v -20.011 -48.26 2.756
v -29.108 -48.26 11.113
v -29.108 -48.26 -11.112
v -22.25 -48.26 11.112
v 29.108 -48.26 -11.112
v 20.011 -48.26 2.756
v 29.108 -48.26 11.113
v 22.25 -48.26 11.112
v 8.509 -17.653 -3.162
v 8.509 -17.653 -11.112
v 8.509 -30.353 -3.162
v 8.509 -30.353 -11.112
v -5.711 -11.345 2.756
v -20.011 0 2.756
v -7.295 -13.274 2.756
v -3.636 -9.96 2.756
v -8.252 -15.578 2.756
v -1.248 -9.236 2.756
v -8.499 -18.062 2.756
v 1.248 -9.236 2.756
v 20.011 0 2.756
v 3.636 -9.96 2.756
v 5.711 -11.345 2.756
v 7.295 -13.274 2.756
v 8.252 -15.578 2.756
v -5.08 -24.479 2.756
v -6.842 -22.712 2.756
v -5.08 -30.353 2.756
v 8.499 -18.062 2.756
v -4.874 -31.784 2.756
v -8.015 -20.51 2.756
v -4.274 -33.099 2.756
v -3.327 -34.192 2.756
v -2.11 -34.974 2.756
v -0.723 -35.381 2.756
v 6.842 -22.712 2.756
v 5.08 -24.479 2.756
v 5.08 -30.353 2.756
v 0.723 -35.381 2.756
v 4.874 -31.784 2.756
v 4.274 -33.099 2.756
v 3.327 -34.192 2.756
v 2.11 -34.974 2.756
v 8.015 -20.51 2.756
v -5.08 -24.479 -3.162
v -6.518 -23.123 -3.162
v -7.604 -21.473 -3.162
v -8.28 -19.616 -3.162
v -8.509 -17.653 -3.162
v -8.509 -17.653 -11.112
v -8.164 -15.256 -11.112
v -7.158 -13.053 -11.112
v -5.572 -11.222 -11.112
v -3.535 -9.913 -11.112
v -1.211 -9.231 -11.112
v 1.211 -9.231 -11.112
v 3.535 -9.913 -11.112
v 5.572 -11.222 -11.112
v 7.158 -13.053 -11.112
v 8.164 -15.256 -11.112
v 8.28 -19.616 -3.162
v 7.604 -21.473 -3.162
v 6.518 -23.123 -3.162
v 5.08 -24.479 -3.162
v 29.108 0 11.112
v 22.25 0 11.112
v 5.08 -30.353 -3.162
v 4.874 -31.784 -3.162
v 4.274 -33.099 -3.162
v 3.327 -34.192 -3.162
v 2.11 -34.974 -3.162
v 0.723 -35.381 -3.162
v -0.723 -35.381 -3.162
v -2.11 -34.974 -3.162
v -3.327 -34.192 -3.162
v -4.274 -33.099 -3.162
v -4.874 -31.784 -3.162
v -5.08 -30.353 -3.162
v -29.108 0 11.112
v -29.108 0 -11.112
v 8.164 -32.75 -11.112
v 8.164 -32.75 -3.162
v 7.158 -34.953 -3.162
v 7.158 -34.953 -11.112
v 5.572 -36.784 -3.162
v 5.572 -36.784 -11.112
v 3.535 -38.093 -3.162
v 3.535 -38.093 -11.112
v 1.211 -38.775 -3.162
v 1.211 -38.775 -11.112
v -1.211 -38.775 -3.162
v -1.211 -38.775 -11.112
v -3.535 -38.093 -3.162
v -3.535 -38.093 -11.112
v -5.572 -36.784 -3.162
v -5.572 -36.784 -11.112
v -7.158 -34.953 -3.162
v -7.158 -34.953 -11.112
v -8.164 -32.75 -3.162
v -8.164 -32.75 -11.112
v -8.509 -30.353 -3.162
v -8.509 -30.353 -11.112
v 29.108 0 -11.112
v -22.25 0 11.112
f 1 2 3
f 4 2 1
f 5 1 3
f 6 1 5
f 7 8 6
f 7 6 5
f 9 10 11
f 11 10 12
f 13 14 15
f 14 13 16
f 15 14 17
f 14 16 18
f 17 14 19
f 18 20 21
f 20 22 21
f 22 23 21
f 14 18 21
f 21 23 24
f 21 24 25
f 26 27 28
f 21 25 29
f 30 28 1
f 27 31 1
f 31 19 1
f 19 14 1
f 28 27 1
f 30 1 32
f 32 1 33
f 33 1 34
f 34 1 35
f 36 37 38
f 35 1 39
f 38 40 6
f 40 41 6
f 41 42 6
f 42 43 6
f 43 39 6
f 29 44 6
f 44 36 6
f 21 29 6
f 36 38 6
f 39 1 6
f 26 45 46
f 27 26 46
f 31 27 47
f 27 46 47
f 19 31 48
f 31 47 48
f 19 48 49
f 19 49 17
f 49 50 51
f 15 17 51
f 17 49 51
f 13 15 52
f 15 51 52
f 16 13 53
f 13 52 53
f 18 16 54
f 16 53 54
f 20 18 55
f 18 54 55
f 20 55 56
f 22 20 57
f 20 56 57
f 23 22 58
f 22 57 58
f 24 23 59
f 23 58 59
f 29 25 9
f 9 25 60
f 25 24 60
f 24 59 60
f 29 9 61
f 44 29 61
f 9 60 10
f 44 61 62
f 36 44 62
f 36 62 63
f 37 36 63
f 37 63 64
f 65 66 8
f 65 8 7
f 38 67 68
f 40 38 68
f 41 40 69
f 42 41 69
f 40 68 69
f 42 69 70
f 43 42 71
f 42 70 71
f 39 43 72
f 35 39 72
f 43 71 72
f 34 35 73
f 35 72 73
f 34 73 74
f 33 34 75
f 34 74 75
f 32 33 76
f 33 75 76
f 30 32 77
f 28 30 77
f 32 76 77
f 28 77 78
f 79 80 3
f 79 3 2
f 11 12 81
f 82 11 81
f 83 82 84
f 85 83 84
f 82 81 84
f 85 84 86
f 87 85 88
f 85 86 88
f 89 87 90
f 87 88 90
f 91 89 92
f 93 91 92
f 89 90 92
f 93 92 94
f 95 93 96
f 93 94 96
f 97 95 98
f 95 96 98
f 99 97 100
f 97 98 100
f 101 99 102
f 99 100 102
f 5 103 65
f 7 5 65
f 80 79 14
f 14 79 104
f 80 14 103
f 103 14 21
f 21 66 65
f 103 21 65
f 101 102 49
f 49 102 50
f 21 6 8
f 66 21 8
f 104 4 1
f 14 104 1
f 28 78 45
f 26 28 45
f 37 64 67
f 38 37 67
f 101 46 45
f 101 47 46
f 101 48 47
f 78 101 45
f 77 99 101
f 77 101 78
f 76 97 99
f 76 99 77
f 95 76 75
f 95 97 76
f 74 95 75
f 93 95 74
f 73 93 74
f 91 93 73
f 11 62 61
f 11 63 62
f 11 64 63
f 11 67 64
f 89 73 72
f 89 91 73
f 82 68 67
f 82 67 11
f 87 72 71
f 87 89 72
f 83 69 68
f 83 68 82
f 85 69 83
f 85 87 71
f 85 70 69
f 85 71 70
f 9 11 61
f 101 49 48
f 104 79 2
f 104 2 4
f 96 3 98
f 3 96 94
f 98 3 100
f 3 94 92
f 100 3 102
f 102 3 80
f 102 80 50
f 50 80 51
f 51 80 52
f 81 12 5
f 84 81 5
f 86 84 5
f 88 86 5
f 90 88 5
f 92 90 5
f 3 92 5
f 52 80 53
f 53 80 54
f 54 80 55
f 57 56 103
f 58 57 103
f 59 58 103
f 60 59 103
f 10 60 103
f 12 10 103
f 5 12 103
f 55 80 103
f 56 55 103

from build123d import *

# Parameters (mm, degrees)
F0_W     = 58.2168
F0_H     = 22.225
F1_DEPTH = 48.26
F3_DEPTH = 48.261
F5_DEPTH = 7.9502
F7_DEPTH = 14.2758


with BuildPart() as f1:
    # F0 (on Front) → F1 (new body)
    with BuildSketch(Plane.XZ):
        Rectangle(F0_W, F0_H)
    extrude(amount=F1_DEPTH)

    # F2 (on face) → F3 (cut, through all)
    with BuildSketch(Plane.XZ.offset(48.26)):
        Polygon((-22.2504, 11.1125), (-20.0112557785, 2.7559), (20.0112557785, 2.7559), (22.2504, 11.1125), (29.1084, 11.1125), (29.1084, 14.9114290252), (-29.1084, 14.9114290252), (-29.1084, 11.1125), align=None)
    extrude(amount=-F3_DEPTH, mode=Mode.SUBTRACT)

    # F4 (on face) → F5 (cut)
    with BuildSketch(Plane(origin=(0, 0, -11.1125), x_dir=(1, 0, 0), z_dir=(0, 0, -1))):
        with BuildLine():
            Line((8.509, 17.653), (8.509, 30.353))
            ThreePointArc((8.509, 30.353), (0, 38.862), (-8.509, 30.353))
            Line((-8.509, 30.353), (-8.509, 17.653))
            ThreePointArc((-8.509, 17.653), (0, 9.144), (8.509, 17.653))
        make_face()
    extrude(amount=-F5_DEPTH, mode=Mode.SUBTRACT)

    # F6 (on face) → F7 (cut, through all)
    with BuildSketch(Plane(origin=(0, 0, -3.1623), x_dir=(1, 0, 0), z_dir=(0, 0, -1))):
        with BuildLine():
            Line((-5.08, 30.353), (-5.08, 24.4791761624))
            ThreePointArc((-5.08, 24.4791761624), (0, 9.144), (5.08, 24.4791761624))
            Line((5.08, 24.4791761624), (5.08, 30.353))
            ThreePointArc((5.08, 30.353), (0, 35.433), (-5.08, 30.353))
        make_face()
    extrude(amount=-F7_DEPTH, mode=Mode.SUBTRACT)


solid = f1.part
